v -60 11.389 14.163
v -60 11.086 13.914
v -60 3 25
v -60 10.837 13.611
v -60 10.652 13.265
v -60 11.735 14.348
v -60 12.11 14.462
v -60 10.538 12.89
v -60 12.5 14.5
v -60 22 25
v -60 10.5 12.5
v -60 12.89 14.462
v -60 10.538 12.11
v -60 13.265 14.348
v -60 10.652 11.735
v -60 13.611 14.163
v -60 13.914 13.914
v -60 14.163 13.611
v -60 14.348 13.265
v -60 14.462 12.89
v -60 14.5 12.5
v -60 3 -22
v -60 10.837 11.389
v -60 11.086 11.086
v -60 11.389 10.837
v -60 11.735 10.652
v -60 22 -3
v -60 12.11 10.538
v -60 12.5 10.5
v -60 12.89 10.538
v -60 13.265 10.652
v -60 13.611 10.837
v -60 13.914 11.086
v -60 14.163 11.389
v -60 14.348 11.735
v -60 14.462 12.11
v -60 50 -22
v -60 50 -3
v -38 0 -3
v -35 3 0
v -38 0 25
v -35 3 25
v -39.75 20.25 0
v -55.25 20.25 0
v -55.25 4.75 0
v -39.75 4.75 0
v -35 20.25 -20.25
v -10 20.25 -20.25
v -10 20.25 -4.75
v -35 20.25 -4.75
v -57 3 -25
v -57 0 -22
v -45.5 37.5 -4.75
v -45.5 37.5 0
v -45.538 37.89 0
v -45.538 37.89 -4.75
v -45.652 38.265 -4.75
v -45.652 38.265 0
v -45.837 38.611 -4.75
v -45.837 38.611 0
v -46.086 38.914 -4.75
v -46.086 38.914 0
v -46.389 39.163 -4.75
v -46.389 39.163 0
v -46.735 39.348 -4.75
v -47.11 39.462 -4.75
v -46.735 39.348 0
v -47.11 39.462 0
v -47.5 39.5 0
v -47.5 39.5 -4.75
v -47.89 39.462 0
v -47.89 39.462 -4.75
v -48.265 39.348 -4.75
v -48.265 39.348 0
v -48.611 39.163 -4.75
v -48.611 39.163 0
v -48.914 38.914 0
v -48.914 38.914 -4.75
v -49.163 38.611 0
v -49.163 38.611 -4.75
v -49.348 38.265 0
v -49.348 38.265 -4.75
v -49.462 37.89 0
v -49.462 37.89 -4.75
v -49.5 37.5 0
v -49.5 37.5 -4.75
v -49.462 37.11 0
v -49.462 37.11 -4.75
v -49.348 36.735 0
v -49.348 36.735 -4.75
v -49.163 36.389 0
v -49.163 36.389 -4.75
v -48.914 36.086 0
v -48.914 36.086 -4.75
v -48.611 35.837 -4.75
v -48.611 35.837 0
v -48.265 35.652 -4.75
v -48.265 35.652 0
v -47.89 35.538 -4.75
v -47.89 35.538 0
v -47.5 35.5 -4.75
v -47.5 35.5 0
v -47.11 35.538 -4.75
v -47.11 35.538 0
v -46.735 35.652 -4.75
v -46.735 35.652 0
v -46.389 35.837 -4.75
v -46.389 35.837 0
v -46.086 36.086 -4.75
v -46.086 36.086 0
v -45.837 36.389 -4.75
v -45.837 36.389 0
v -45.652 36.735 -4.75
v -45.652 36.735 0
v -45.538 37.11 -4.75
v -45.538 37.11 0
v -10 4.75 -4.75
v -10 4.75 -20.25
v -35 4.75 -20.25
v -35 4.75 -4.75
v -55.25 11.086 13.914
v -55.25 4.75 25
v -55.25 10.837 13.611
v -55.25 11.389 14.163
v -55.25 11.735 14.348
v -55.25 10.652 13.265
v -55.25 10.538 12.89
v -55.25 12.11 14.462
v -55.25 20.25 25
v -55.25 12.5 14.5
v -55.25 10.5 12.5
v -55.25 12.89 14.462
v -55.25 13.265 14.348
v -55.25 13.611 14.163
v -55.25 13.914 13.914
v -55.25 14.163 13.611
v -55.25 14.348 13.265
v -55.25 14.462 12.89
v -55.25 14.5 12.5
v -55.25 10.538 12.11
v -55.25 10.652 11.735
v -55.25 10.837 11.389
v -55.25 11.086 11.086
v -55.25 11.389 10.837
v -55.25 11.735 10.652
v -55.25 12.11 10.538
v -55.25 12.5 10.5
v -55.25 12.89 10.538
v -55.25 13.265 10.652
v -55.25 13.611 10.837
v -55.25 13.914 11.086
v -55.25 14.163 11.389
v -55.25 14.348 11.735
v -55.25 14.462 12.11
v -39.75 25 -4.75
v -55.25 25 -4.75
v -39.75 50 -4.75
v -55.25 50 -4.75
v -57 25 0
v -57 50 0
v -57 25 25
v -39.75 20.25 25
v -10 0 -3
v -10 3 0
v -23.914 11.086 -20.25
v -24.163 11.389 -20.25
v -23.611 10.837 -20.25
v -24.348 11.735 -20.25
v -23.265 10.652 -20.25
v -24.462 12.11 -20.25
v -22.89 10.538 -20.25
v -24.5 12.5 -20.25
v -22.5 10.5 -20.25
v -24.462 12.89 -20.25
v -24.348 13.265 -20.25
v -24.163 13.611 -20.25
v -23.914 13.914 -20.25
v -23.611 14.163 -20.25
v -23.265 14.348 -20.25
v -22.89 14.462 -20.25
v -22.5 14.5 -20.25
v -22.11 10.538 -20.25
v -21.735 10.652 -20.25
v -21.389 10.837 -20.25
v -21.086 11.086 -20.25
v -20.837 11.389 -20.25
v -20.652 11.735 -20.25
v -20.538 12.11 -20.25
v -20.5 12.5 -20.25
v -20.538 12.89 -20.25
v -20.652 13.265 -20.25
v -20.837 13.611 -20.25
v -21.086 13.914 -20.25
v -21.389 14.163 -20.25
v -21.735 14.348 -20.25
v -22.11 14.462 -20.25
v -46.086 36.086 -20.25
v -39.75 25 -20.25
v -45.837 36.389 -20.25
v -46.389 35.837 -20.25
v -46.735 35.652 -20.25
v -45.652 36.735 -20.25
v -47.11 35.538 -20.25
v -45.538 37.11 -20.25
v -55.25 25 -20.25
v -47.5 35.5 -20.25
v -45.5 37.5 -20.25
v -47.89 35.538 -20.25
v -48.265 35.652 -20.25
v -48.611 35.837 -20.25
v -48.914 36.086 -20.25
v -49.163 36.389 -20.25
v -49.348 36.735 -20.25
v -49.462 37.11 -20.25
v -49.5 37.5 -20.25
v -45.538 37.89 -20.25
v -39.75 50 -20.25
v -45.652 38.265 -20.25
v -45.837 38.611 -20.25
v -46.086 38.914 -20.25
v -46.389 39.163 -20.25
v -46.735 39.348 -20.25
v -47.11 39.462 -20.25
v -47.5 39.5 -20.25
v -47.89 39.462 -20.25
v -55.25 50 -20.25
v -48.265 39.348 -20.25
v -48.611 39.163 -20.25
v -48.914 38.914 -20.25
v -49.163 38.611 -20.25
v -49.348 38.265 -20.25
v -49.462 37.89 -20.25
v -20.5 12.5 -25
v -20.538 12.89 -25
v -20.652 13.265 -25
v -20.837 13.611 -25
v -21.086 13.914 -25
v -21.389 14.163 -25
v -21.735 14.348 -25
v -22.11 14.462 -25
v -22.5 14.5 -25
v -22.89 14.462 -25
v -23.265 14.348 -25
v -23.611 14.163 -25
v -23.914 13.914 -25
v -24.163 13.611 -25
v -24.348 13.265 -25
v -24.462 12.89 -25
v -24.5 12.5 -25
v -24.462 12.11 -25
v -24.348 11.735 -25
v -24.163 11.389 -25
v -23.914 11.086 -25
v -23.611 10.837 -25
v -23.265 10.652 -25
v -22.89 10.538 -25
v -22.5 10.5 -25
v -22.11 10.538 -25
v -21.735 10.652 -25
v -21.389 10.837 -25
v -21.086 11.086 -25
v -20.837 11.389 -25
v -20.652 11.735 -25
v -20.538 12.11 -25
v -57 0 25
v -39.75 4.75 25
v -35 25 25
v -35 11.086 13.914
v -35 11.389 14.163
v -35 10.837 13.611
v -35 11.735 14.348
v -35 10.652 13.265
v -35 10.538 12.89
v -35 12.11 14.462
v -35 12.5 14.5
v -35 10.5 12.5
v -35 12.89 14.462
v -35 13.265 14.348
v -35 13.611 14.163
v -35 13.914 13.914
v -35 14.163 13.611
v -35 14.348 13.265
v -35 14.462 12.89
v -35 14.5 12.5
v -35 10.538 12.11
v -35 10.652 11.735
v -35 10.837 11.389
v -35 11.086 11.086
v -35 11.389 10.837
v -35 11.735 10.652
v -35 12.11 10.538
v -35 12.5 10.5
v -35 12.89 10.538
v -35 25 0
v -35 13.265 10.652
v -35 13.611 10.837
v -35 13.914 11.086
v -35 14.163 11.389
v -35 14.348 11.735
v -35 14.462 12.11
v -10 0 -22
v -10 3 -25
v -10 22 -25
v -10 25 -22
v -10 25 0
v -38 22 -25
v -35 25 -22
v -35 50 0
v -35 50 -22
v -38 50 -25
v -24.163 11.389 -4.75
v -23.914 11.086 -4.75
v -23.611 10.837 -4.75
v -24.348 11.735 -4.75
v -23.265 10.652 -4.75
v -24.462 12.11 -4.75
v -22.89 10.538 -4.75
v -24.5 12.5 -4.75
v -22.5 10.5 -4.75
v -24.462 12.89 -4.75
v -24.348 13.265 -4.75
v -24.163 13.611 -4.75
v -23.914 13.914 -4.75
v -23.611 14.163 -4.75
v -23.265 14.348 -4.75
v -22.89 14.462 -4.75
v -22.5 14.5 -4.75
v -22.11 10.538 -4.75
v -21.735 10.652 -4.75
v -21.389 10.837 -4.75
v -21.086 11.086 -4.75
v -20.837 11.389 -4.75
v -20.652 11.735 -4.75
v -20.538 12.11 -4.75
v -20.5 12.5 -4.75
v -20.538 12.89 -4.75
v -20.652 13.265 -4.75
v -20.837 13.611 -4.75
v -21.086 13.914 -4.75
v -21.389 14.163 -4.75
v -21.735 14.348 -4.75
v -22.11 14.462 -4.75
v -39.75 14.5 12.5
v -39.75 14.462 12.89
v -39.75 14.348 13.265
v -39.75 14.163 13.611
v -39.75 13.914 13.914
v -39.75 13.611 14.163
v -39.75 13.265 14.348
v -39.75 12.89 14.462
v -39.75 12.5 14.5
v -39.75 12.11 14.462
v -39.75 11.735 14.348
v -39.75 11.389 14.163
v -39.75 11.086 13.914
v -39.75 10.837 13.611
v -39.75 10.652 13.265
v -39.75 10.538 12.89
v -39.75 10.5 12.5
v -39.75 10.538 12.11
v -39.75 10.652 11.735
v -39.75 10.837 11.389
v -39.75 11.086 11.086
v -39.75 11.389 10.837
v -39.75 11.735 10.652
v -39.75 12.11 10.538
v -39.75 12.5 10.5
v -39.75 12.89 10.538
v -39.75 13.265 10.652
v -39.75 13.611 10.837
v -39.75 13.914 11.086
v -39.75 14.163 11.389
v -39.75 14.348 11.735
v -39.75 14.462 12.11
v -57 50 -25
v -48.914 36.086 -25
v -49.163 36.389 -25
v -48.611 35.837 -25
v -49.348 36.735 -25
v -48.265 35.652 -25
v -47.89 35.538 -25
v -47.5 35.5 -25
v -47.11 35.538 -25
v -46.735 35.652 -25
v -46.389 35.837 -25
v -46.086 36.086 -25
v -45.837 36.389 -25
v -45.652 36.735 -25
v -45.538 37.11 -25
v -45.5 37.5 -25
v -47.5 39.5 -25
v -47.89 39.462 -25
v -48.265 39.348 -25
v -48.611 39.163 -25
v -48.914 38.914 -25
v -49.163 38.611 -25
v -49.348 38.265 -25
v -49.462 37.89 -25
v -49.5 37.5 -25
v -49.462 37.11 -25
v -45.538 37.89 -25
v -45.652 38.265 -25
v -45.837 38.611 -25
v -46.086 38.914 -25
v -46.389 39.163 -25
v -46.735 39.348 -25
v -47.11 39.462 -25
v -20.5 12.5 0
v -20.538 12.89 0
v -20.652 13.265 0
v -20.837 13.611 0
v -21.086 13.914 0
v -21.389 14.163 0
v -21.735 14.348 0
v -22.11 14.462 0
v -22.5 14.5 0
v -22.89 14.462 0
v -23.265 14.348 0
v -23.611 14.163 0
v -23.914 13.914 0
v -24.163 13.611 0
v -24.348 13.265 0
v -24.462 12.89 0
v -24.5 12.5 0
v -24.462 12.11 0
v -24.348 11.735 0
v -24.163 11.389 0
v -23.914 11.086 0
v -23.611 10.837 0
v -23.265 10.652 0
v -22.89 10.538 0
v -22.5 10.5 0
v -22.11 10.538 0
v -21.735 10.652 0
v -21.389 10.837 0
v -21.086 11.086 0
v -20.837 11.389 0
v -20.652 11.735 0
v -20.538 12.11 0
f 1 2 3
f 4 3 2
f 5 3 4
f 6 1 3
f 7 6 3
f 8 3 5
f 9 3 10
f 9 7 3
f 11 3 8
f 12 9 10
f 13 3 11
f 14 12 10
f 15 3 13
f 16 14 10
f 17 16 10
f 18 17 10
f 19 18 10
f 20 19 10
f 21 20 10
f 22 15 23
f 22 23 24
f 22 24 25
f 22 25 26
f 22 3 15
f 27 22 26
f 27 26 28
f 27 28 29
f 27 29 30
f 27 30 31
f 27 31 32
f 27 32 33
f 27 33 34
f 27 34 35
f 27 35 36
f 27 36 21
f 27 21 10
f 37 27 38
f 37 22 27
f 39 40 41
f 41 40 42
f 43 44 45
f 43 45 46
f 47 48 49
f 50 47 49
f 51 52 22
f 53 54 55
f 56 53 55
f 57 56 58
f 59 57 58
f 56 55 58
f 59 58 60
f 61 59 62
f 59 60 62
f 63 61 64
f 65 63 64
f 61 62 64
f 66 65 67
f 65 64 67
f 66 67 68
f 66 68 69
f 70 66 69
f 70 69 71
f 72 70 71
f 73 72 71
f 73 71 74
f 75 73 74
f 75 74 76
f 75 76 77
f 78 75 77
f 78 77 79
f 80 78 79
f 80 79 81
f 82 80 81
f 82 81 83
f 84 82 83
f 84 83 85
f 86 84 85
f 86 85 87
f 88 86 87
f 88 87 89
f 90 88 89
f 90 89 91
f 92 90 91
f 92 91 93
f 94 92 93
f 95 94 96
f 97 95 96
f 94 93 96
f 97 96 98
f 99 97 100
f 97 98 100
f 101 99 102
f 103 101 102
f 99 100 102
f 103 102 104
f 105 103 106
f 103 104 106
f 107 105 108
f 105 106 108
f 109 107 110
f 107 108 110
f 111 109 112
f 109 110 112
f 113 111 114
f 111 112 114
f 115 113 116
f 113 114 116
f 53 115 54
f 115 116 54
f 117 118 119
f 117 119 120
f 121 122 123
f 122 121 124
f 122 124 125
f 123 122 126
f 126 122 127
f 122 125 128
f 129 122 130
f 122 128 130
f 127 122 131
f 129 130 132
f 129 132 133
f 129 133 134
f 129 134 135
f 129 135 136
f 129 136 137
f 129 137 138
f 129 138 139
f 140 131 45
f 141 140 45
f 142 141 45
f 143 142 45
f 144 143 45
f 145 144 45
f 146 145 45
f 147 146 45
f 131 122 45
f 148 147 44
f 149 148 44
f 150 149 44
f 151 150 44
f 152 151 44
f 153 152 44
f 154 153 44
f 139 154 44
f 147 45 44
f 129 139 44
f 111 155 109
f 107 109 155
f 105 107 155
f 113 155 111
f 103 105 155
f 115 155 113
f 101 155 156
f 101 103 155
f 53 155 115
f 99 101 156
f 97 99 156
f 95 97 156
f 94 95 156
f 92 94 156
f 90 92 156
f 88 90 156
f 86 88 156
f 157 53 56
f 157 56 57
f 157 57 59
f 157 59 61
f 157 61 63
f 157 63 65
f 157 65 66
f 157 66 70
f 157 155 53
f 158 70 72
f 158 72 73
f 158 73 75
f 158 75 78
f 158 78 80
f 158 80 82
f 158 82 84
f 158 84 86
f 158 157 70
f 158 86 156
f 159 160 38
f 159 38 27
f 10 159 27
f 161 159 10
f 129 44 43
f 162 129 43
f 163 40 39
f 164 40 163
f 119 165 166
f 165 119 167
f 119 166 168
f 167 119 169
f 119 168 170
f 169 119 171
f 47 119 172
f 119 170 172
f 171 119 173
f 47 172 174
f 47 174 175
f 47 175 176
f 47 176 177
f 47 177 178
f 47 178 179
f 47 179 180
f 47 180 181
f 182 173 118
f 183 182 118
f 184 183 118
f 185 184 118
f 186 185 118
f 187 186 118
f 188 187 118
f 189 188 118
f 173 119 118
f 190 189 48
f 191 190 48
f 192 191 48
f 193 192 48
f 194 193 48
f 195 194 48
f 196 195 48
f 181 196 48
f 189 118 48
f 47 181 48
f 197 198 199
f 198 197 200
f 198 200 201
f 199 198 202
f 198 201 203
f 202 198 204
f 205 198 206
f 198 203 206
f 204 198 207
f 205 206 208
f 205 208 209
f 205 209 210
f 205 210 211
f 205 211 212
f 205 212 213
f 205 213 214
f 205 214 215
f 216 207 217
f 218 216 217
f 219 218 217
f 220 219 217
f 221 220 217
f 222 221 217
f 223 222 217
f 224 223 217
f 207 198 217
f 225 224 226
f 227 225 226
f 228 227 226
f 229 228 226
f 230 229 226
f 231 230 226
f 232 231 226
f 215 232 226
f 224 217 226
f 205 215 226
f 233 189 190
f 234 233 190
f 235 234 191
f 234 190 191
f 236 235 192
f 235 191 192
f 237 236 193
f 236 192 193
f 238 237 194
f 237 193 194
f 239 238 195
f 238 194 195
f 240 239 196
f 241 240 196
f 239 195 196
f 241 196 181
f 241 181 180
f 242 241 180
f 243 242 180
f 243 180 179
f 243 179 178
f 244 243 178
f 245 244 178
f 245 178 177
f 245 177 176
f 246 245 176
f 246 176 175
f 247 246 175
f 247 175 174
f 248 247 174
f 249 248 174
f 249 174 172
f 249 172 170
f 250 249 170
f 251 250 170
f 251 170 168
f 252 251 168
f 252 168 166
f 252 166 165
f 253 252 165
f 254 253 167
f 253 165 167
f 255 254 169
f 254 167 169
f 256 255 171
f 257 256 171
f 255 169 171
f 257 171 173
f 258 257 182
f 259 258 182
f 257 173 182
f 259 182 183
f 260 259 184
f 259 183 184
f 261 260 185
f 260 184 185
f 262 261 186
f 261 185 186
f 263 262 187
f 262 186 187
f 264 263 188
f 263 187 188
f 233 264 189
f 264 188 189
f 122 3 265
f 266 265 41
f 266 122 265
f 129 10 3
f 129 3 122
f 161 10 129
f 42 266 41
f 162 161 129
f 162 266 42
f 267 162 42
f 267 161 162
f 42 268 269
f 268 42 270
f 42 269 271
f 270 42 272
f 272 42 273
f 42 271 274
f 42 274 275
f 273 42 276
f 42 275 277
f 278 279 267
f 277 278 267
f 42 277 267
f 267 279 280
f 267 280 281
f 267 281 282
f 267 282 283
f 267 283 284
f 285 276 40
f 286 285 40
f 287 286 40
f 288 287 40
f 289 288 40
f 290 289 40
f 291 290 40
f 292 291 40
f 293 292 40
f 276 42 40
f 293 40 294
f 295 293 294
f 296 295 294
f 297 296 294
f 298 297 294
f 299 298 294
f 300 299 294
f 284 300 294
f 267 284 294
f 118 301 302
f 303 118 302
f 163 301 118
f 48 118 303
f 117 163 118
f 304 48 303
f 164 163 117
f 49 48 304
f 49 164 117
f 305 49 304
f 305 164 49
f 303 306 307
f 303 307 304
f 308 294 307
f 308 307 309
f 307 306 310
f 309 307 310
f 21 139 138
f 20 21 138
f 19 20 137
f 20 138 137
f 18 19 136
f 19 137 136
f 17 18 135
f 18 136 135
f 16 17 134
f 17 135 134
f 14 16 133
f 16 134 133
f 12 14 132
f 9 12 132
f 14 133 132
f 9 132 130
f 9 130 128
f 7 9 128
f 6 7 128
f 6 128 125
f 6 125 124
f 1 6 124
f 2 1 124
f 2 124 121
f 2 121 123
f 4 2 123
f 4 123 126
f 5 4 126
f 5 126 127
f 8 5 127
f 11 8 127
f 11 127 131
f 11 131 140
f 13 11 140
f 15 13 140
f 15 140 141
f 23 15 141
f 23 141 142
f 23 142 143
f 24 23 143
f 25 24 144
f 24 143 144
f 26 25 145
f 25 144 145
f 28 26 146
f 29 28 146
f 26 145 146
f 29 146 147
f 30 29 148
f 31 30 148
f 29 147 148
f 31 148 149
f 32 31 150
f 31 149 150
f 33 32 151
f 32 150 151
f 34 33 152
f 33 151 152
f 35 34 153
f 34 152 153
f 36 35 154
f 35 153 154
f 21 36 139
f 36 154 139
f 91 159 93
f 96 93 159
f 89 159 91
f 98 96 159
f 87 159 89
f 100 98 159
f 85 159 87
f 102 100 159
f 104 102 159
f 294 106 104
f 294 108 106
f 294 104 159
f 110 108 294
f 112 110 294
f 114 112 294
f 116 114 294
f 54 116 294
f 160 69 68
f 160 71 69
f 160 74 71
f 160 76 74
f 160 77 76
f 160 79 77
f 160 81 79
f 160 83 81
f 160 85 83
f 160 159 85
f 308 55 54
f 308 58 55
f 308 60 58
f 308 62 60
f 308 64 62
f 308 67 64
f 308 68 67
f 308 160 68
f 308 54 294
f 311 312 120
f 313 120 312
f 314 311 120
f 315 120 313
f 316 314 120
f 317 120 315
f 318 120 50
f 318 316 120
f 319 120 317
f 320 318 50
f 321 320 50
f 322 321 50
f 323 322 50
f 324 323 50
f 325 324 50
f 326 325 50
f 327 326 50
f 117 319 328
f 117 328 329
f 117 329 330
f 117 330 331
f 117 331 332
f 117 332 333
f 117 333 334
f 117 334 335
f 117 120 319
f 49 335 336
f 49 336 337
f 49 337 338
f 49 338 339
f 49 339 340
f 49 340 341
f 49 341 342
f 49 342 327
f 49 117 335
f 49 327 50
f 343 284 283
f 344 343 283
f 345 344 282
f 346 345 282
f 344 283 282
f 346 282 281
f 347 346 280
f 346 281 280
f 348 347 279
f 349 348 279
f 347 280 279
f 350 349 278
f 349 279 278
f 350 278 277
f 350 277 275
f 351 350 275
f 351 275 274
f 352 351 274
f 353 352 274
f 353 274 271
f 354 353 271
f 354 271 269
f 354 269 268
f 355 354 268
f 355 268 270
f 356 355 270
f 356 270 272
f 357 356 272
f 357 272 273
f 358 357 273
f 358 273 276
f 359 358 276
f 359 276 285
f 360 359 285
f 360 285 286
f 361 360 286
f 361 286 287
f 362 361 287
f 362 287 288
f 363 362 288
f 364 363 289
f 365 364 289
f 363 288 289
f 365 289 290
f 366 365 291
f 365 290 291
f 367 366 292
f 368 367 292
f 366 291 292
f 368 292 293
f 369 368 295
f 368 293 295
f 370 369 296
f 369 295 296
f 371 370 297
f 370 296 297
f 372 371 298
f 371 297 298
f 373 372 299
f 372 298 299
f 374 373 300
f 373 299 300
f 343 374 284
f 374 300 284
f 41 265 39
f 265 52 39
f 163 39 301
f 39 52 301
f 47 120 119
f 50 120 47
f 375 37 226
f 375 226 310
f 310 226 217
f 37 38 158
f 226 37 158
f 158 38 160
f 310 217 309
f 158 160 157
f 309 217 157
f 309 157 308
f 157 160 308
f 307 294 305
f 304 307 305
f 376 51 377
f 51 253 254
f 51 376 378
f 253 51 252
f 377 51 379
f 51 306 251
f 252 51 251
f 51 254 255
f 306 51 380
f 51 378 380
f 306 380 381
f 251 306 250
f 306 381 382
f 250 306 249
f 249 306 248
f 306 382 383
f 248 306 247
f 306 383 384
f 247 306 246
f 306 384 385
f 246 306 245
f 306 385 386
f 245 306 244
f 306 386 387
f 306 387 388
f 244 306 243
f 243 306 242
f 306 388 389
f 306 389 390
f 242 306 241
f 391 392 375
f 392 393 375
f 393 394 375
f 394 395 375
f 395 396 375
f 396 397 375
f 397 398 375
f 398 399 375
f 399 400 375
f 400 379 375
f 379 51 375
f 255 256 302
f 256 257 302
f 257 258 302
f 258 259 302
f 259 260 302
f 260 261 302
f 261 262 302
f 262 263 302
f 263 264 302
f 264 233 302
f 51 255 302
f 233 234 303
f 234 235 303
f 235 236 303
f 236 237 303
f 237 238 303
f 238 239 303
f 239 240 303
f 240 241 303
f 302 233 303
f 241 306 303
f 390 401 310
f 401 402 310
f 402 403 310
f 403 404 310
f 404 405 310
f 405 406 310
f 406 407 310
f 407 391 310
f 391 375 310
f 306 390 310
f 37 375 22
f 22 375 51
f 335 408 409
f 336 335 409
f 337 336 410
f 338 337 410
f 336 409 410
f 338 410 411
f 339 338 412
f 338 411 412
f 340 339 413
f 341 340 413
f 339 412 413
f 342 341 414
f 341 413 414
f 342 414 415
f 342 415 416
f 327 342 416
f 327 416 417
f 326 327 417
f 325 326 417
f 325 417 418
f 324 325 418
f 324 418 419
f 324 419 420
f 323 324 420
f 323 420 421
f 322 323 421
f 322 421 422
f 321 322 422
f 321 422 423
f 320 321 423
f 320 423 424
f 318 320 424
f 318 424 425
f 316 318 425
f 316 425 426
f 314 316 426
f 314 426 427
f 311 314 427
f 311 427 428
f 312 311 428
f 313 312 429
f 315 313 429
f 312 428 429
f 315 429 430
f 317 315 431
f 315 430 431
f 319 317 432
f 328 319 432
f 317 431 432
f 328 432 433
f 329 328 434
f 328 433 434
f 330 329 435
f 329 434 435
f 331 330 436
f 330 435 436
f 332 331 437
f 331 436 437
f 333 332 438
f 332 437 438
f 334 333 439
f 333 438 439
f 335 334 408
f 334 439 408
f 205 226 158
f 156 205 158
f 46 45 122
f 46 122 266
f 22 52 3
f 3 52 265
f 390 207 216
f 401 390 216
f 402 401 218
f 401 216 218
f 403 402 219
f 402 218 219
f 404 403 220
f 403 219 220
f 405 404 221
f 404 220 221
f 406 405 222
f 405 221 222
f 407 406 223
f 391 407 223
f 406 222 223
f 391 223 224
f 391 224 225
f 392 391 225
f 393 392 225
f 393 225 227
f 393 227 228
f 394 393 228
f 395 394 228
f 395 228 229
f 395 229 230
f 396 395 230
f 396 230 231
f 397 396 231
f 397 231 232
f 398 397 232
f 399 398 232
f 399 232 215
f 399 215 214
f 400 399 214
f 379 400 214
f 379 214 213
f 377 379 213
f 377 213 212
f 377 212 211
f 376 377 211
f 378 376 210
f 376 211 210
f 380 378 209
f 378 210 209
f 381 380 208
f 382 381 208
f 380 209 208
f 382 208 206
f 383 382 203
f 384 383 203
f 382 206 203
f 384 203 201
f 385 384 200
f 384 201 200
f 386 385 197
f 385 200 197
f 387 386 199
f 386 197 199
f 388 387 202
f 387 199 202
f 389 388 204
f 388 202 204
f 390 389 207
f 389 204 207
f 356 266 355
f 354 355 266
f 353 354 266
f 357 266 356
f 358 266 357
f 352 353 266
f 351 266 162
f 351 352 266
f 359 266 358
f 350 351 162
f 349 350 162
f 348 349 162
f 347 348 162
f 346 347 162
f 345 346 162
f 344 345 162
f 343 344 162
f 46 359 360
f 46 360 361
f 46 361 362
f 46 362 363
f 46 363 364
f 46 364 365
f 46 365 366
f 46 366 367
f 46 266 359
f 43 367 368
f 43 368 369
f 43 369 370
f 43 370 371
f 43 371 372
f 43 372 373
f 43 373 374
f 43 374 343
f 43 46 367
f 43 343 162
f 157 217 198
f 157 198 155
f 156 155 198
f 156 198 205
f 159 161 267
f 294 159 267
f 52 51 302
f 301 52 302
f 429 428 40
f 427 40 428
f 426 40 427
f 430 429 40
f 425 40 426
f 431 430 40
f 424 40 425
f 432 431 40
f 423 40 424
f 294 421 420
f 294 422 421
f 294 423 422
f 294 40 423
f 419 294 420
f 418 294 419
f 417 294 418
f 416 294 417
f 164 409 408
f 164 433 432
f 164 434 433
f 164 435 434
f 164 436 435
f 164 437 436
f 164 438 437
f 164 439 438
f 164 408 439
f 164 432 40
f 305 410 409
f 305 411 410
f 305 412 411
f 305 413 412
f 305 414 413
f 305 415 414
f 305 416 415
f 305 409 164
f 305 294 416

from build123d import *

# Parameters (mm, degrees)
F0_W     = 25
F0_H     = 25
F0_R     = 2
F0_W_2   = 15.5
F0_H_2   = 15.5
F1_DEPTH = 25
F2_W     = 15.5
F2_H     = 15.5
F3_DEPTH = 25
F4_W     = 15.5
F4_H     = 15.5
F5_DEPTH = 25
F6_DEPTH = 25
F8_SIZE  = 3
F7_R     = 2
F9_DEPTH = 25


with BuildPart() as f1:
    # F0 (on Top) → F1 (new body)
    with BuildSketch(Plane.XY):
        with Locations((-47.5, 37.5)):
            Rectangle(F0_W, F0_H)
        with Locations((-47.5, 37.5)):
            Circle(F0_R, mode=Mode.SUBTRACT)
        with Locations((-22.5, 12.5)):
            Rectangle(F0_W, F0_H)
        with Locations((-22.5, 12.5)):
            Circle(F0_R, mode=Mode.SUBTRACT)
        with Locations((-47.5, 12.5)):
            Rectangle(F0_W, F0_H)
        with Locations((-47.5, 12.5)):
            Rectangle(F0_W_2, F0_H_2, mode=Mode.SUBTRACT)
        with Locations((-47.5, 12.5)):
            Rectangle(F0_W_2, F0_H_2)
    extrude(amount=-F1_DEPTH)

    # F2 (on face) → F3 (cut)
    with BuildSketch(Plane.YZ.offset(-10)):
        with Locations((12.5, -12.5)):
            Rectangle(F2_W, F2_H)
    extrude(amount=-F3_DEPTH, mode=Mode.SUBTRACT)

    # F4 (on face) → F5 (cut)
    with BuildSketch(Plane(origin=(0, 50, 0), x_dir=(-1, 0, 0), z_dir=(0, 1, 0))):
        with Locations((47.5, -12.5)):
            Rectangle(F4_W, F4_H)
    extrude(amount=-F5_DEPTH, mode=Mode.SUBTRACT)

    # F0 (on Top) → F6 (join)
    with BuildSketch(Plane.XY):
        with Locations((-47.5, 12.5)):
            Rectangle(F0_W, F0_H)
        with Locations((-47.5, 12.5)):
            Rectangle(F0_W_2, F0_H_2, mode=Mode.SUBTRACT)
    extrude(amount=F6_DEPTH)

    # F8
    f8_edges = [f1.edges().sort_by_distance(p)[0] for p in [
        (-60, 0, 0),
        (-35, 0, -25),
        (-60, 25, -25),
        (-35, 0, 12.5),
        (-22.5, 0, 0),
        (-35, 37.5, -25),
        (-22.5, 25, -25),
        (-60, 37.5, 0),
        (-60, 25, 12.5),
    ]]
    chamfer(f8_edges, length=F8_SIZE)

    # F7 (on face) → F9 (cut)
    with BuildSketch(Plane.YZ.offset(-35)):
        with Locations((12.5, 12.5)):
            Circle(F7_R)
    extrude(amount=-F9_DEPTH, mode=Mode.SUBTRACT)


solid = f1.part
